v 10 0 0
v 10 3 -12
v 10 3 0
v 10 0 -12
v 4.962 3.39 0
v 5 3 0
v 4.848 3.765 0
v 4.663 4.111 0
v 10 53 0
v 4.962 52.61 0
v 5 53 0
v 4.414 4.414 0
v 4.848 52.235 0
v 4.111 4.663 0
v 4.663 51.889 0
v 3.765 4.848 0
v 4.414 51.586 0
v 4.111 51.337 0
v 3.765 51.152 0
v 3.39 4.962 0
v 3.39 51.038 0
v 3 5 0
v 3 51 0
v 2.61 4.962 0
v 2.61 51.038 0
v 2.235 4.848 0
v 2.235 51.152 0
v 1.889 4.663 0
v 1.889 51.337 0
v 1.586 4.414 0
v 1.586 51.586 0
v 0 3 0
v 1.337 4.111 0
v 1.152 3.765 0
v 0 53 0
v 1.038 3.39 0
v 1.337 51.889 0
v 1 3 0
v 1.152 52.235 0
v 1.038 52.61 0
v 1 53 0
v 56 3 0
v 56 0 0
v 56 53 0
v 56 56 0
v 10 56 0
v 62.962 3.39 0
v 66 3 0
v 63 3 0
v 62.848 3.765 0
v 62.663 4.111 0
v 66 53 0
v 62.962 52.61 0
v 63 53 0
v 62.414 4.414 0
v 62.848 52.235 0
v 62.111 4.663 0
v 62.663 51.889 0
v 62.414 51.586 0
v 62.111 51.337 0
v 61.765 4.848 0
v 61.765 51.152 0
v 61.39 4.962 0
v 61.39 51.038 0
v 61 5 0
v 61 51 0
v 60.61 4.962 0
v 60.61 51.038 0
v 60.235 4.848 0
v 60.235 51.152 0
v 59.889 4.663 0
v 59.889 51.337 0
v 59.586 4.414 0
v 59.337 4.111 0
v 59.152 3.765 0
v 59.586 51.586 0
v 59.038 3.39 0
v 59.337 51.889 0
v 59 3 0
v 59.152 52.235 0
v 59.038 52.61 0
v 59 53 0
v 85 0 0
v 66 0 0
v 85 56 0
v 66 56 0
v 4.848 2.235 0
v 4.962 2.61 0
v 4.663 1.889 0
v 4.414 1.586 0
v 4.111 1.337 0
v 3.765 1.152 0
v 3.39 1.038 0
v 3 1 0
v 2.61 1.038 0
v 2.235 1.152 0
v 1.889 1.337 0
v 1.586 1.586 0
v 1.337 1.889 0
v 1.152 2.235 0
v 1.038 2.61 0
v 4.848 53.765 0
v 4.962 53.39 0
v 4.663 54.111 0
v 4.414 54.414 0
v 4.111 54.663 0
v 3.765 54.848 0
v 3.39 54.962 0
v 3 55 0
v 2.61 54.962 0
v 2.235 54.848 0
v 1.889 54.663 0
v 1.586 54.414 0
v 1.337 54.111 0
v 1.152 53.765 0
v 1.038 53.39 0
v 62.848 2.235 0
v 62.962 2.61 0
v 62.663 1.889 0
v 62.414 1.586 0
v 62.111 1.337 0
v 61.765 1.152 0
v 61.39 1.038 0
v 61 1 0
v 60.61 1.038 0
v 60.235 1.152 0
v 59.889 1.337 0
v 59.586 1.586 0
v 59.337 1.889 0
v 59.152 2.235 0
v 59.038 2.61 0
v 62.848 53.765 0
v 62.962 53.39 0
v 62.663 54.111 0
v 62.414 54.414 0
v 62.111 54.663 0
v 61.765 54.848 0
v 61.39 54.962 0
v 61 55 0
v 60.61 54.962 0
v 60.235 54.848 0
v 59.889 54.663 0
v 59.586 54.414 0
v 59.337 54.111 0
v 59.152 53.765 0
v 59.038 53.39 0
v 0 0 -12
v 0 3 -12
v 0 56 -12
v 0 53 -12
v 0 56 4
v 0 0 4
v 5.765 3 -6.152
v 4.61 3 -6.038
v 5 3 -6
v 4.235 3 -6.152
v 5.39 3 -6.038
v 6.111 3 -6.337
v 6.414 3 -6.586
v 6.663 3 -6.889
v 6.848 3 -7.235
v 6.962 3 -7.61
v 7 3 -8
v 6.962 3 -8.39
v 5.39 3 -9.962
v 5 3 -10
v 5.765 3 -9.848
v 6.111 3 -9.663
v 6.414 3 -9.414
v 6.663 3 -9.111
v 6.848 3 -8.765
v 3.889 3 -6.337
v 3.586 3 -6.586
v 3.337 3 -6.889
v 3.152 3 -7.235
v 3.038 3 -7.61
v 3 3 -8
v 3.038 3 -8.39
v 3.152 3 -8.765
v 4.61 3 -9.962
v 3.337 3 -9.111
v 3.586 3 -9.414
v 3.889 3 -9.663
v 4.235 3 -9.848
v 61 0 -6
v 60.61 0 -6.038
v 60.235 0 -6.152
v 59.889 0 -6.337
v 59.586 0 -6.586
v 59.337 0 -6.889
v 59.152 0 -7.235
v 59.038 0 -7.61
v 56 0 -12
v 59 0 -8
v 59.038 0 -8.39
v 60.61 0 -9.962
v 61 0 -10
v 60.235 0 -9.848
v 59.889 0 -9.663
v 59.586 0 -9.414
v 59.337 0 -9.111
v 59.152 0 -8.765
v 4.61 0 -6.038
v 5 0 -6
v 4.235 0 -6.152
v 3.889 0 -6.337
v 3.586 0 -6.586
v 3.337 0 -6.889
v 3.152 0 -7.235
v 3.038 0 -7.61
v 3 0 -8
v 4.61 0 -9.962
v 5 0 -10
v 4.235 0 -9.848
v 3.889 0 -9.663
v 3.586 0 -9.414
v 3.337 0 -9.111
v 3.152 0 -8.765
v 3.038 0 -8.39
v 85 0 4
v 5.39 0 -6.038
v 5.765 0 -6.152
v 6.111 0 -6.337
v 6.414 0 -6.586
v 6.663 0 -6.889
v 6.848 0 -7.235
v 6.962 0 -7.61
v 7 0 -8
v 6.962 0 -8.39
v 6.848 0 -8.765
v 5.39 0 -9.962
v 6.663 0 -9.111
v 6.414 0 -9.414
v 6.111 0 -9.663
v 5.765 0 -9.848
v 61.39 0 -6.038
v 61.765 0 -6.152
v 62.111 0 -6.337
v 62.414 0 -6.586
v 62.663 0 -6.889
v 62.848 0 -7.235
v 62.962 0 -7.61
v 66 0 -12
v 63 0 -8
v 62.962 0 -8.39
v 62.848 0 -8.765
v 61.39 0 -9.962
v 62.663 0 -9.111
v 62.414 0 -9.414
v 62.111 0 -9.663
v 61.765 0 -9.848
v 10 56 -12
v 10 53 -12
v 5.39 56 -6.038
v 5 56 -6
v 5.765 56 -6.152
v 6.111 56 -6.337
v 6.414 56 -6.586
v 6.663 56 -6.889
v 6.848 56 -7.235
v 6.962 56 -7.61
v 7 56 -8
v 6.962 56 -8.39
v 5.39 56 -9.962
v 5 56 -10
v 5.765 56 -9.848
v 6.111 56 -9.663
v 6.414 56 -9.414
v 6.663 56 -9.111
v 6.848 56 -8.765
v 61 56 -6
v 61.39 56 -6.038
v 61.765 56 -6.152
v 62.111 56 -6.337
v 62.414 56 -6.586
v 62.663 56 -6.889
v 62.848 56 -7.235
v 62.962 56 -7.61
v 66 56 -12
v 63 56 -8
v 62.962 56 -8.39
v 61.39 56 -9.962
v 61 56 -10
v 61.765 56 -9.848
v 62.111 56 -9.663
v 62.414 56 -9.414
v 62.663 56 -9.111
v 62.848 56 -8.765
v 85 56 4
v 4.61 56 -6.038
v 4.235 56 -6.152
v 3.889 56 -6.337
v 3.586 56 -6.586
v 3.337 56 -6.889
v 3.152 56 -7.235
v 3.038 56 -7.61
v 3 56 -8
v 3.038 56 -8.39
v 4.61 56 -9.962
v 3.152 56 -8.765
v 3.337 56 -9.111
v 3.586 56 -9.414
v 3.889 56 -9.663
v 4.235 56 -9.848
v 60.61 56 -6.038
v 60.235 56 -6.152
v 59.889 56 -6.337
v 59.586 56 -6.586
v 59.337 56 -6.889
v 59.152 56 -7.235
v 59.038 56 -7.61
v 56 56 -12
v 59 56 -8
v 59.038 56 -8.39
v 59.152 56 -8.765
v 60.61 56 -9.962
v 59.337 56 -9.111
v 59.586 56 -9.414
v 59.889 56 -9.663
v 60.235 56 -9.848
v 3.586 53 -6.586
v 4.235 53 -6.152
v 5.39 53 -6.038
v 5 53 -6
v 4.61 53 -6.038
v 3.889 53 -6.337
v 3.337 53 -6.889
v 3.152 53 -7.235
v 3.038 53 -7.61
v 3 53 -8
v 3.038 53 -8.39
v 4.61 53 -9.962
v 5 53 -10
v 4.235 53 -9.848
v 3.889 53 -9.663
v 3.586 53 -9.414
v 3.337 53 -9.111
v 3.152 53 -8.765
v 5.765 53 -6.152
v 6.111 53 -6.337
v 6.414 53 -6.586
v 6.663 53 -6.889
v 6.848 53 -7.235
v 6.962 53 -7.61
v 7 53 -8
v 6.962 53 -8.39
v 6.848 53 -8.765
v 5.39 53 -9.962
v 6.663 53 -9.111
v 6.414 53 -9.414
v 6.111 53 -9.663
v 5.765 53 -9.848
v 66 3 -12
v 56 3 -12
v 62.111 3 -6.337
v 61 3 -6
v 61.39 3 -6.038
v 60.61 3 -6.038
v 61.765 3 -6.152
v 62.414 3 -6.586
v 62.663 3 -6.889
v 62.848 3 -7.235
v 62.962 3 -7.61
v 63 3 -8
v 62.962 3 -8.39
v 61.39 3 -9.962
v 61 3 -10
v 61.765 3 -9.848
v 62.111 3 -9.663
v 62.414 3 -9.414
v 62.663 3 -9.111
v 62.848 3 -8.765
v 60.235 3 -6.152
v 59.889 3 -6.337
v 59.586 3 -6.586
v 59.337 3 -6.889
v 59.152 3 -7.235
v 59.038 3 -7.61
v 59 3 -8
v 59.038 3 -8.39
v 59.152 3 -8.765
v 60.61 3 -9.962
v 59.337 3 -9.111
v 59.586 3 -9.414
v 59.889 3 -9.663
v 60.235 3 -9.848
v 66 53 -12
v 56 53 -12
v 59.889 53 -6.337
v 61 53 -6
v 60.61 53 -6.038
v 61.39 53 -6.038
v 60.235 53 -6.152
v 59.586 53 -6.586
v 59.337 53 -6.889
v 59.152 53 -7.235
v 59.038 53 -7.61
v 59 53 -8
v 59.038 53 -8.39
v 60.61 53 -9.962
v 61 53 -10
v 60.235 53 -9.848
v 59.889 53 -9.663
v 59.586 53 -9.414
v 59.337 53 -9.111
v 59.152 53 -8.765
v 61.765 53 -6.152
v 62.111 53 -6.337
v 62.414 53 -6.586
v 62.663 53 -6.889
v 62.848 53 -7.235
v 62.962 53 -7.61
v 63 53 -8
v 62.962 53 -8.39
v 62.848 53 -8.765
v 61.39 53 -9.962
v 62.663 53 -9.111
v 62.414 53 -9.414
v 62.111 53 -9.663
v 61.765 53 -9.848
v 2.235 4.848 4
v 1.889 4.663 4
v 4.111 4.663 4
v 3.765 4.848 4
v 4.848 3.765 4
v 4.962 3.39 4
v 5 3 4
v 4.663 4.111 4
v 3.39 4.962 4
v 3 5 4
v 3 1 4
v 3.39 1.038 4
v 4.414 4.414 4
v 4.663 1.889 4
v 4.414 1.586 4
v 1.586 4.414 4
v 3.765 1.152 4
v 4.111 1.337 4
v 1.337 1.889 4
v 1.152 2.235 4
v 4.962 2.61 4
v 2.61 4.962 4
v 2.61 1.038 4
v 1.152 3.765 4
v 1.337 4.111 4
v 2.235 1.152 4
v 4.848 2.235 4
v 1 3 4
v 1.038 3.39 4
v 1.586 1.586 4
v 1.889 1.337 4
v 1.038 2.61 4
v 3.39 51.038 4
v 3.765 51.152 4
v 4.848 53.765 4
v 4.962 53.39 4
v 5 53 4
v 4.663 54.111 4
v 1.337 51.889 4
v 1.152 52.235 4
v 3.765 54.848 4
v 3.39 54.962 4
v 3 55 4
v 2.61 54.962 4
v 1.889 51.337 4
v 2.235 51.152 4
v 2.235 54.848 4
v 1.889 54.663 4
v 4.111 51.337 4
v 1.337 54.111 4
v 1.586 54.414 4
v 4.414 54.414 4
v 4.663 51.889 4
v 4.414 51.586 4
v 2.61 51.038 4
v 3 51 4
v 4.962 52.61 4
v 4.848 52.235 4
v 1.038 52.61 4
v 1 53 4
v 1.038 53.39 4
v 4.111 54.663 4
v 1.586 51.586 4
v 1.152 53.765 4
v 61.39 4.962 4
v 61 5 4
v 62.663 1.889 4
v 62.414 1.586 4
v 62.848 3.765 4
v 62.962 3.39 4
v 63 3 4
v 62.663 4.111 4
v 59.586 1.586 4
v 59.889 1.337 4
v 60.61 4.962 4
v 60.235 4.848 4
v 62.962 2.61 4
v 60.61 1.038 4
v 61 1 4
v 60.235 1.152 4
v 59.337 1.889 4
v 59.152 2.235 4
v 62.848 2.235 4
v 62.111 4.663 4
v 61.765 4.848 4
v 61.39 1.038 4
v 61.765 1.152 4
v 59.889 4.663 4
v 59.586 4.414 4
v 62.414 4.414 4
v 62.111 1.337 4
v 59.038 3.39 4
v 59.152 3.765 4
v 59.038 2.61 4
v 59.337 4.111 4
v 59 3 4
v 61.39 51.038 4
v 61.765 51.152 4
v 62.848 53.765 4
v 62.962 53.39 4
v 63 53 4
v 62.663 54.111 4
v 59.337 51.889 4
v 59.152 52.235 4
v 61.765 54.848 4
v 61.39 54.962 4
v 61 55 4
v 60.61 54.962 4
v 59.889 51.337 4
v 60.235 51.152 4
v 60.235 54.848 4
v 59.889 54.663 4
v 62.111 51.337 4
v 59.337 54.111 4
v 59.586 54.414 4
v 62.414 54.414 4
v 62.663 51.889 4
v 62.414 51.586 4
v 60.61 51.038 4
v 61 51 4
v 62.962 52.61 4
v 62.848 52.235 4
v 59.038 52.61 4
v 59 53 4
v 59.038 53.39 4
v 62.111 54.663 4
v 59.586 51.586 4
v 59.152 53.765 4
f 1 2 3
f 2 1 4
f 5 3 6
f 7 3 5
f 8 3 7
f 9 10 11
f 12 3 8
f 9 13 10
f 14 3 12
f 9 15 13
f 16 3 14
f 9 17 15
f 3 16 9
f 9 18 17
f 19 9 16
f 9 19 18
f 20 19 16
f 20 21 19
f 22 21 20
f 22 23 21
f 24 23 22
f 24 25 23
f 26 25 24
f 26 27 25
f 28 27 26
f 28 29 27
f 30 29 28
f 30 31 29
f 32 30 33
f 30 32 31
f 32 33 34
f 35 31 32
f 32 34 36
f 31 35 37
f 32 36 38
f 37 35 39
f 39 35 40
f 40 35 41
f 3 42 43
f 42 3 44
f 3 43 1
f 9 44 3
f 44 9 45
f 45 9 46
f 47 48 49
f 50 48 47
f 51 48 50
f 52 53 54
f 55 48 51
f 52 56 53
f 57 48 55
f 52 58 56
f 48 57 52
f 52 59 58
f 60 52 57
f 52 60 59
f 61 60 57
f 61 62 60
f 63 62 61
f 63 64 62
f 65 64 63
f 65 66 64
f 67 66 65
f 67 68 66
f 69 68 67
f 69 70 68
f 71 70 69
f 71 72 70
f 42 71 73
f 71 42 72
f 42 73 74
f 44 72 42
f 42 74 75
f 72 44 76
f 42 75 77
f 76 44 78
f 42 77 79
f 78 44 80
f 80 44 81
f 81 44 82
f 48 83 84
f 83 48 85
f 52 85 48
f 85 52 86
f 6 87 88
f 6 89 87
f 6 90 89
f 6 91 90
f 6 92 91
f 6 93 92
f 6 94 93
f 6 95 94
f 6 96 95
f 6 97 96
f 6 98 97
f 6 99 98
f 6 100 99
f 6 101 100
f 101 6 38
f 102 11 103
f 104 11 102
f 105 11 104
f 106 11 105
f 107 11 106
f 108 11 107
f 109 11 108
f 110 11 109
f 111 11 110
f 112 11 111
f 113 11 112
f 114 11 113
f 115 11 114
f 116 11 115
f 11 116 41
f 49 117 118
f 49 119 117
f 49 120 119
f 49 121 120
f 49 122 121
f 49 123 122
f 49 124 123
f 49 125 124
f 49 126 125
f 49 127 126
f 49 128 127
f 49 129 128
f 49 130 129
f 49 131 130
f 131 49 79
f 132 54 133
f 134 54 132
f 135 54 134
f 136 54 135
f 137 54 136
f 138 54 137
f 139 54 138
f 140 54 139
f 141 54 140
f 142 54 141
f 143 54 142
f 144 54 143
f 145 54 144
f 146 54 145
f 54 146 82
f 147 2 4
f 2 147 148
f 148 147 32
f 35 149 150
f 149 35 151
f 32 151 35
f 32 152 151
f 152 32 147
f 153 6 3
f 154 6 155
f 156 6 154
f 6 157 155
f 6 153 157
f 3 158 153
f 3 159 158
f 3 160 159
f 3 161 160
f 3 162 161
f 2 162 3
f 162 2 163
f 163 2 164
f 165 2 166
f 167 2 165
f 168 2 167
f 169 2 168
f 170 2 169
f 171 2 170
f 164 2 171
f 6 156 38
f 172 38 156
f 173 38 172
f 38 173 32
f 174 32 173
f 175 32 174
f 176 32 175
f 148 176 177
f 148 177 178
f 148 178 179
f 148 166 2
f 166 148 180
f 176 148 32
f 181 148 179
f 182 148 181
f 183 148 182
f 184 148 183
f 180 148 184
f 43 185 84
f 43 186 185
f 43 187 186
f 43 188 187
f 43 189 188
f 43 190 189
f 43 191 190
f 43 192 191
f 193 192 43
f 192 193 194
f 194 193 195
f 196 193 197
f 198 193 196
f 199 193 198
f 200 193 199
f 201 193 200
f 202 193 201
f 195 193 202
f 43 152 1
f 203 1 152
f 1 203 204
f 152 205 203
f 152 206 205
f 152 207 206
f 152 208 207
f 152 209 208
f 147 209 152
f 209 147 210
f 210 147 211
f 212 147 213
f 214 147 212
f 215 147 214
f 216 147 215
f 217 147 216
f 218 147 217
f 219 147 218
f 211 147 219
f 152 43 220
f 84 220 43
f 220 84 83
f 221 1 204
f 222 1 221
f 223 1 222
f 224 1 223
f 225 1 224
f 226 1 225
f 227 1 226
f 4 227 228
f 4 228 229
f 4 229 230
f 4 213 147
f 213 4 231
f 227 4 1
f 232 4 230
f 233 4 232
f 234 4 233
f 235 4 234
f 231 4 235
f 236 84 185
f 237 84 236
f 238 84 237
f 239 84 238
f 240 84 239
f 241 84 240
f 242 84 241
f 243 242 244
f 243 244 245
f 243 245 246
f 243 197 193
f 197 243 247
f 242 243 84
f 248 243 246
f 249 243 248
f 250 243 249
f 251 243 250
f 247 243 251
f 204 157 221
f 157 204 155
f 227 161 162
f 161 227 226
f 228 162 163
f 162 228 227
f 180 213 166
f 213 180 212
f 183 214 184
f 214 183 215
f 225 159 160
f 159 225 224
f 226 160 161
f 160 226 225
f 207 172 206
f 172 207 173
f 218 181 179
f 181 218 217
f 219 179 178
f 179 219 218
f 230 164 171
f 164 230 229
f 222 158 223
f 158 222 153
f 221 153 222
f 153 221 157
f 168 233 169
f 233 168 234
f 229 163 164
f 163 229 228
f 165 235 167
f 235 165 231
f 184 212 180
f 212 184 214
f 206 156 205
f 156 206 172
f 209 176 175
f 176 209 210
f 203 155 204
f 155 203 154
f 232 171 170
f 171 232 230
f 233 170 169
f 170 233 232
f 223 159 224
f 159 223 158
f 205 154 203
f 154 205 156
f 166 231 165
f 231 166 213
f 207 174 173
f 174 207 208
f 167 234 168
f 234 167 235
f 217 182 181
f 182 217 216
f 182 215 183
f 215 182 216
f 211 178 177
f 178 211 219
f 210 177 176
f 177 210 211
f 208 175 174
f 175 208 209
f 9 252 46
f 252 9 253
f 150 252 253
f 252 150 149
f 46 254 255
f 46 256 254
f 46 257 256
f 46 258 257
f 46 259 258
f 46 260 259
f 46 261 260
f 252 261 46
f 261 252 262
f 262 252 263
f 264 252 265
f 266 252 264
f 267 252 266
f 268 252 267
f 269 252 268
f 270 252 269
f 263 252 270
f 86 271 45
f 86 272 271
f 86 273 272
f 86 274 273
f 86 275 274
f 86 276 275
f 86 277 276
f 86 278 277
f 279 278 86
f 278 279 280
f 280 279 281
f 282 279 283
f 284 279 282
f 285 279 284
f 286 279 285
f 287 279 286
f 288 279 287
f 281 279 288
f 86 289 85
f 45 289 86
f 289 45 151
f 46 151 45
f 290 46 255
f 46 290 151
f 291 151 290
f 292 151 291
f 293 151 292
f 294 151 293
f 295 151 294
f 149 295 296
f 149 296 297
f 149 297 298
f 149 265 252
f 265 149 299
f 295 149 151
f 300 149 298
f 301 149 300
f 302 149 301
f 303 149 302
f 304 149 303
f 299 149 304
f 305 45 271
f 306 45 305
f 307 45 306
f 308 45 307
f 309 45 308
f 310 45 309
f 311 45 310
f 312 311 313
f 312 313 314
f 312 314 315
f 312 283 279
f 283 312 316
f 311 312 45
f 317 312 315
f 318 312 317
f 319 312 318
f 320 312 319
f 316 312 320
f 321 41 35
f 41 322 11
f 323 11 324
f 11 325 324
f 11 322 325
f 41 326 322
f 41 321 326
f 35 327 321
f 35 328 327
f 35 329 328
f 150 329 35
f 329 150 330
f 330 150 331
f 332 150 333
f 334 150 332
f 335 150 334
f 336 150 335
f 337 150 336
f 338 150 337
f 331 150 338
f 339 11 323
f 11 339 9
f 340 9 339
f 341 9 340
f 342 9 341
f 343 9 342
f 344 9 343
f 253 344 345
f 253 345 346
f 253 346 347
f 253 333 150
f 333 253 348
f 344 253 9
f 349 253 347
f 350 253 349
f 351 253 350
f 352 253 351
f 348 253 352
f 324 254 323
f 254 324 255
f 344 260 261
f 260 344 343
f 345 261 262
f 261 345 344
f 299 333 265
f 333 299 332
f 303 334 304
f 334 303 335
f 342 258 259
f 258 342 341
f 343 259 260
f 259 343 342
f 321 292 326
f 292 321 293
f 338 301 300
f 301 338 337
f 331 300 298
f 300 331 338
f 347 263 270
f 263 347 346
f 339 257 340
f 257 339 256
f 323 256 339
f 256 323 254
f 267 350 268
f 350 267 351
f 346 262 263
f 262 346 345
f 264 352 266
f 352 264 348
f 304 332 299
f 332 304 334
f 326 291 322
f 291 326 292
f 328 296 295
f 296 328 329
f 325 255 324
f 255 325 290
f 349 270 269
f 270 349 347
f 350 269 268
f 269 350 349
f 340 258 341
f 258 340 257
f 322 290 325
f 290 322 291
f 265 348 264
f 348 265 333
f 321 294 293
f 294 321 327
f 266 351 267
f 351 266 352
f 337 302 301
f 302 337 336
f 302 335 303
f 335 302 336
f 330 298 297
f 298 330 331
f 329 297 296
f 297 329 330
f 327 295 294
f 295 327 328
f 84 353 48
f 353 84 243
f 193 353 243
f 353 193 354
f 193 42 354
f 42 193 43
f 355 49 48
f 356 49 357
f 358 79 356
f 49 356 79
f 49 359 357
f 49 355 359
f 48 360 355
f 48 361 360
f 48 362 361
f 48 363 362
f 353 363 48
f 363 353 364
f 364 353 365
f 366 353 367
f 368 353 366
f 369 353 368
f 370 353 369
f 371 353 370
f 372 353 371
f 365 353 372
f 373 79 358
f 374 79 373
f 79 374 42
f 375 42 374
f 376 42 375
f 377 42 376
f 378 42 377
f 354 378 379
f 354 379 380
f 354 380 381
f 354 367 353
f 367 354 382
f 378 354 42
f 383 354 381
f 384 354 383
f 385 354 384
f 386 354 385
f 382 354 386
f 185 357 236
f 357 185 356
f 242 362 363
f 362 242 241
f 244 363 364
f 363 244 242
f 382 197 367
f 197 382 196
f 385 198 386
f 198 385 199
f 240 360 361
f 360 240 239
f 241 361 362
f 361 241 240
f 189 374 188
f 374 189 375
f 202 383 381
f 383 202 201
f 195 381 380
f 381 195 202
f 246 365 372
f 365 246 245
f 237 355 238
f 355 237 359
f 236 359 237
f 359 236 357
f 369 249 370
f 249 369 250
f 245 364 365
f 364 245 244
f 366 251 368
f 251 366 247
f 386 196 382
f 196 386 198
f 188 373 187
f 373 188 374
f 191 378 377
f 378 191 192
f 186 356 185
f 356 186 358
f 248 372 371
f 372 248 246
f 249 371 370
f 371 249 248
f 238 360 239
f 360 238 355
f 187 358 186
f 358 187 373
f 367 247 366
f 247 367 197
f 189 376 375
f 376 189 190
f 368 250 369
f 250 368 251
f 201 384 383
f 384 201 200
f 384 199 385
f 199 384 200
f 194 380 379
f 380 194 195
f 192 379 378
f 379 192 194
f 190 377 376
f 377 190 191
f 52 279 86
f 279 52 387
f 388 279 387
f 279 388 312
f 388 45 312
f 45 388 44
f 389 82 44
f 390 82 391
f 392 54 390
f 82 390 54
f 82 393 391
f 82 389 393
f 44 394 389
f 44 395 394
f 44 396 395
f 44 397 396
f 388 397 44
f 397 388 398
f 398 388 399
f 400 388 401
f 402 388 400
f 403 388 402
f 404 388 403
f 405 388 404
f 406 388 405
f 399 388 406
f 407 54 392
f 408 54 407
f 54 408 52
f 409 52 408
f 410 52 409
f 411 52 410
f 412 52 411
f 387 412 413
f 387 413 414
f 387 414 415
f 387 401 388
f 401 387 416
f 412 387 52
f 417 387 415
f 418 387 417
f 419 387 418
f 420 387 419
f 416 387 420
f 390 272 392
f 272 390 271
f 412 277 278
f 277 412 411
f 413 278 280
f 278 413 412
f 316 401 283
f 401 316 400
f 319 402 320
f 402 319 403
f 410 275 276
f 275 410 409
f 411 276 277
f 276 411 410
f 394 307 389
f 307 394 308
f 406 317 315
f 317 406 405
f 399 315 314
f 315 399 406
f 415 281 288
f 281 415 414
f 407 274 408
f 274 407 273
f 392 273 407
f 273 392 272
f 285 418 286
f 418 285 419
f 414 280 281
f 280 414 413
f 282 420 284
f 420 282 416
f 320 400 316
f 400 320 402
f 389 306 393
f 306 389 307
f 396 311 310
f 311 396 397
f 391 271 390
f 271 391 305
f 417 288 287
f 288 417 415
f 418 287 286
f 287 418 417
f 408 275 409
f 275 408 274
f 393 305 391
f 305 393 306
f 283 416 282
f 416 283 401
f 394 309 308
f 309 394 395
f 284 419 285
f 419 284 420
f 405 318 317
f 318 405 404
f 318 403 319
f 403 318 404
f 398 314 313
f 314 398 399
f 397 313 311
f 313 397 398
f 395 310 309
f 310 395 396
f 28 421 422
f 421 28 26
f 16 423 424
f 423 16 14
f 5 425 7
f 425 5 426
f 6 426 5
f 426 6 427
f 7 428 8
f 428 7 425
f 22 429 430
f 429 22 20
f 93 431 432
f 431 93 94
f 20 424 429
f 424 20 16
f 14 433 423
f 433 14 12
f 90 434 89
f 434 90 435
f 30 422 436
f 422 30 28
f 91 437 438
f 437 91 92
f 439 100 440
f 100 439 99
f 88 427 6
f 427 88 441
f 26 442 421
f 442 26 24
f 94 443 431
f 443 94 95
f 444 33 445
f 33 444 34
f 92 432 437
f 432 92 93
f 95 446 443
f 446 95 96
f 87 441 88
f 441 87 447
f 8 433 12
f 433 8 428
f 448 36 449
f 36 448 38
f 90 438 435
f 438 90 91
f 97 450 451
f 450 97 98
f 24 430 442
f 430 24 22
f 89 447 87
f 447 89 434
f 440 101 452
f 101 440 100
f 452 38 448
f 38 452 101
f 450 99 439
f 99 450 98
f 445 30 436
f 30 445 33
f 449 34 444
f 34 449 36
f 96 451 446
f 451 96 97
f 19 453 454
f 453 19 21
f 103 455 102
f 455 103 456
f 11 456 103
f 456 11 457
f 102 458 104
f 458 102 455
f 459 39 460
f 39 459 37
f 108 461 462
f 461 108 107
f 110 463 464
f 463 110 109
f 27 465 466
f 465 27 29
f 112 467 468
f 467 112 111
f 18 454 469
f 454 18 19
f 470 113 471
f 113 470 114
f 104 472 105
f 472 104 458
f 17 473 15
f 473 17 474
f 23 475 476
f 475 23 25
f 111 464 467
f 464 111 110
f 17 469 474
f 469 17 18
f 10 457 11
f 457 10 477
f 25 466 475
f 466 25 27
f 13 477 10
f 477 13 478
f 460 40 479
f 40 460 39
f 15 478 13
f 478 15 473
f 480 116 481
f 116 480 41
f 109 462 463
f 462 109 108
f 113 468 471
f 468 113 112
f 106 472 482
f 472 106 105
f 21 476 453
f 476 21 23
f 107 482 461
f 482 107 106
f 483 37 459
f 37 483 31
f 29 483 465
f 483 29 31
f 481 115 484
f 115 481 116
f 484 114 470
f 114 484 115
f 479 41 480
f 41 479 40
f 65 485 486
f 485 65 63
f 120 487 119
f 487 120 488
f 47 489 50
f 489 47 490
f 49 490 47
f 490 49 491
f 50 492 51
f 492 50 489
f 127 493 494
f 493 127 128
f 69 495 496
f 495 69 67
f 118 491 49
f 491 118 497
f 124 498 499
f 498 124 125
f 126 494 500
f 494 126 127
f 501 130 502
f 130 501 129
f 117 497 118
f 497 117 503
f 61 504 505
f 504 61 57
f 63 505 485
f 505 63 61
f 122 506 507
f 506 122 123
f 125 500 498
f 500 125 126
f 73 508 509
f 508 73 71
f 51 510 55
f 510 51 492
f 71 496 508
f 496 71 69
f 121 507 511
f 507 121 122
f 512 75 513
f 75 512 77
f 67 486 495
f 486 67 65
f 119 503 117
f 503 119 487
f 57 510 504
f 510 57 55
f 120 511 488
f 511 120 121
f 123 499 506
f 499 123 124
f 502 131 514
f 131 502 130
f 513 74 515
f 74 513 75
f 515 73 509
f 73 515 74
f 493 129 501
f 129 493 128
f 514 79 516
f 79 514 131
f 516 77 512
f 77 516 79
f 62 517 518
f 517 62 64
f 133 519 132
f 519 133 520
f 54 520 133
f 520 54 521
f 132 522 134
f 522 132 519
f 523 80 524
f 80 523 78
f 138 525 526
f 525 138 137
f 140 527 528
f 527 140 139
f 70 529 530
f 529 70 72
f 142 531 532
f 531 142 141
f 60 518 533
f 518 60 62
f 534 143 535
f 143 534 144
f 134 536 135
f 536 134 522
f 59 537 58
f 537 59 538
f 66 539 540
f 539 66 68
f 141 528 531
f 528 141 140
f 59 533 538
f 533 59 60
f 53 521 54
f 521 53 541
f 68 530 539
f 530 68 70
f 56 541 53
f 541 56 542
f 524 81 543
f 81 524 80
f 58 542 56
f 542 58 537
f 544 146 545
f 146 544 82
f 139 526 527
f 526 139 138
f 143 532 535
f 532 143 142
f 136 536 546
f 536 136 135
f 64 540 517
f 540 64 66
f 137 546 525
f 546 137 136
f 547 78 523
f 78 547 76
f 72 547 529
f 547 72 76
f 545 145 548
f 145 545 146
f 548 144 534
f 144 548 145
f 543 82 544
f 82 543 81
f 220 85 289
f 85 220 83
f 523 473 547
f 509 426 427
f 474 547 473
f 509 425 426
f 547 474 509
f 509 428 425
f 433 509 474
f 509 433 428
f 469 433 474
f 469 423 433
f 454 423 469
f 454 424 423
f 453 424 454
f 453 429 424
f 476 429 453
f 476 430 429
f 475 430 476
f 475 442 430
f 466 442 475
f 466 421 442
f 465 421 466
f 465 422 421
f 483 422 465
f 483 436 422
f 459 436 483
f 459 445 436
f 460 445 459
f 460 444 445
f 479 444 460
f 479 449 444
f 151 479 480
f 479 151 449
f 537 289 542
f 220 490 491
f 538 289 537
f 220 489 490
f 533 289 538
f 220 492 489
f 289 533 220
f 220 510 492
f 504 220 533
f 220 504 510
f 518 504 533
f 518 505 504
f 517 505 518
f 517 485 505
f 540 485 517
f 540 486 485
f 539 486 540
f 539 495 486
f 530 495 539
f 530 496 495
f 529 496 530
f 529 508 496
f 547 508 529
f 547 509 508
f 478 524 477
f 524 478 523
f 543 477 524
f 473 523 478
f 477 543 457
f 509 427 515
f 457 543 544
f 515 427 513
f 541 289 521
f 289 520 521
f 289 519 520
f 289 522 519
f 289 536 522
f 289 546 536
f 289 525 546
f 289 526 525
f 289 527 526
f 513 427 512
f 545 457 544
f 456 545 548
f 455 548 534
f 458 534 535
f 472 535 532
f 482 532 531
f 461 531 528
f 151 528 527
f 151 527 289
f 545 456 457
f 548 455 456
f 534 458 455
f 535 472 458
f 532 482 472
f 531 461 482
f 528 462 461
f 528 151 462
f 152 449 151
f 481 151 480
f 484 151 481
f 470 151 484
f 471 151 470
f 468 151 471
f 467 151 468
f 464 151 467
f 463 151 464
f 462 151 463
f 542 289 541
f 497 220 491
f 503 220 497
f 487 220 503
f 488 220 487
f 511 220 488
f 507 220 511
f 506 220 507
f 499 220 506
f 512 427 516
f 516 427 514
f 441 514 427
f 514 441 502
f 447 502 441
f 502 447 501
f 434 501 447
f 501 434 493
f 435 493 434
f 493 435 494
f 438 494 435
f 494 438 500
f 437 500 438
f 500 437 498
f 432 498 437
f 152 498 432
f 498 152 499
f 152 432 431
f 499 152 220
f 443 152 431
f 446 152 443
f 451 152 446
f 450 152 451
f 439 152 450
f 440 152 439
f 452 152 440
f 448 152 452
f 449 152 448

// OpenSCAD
$fn = 32;

BASE_WIDTH = 56;
BASE_LENGTH = 85;
HEIGHT = 4;

HOLES_DIST = 58;
CYLINDER_OFFSET = 3;

HANGER_LEN = 10;
HANGER_WIDTH = 3;
HANGER_HEIGHT = 12;



module cylinders3(h, r1, r2, LEN, WIDTH, xNum, yNum) {
     for (i = [0:LEN/(xNum-1):LEN]){
         for (n = [0:WIDTH/(yNum-1):WIDTH]){    translate([-HANGER_LEN/2 + CYLINDER_OFFSET + HOLES_DIST,0,0]) hanger();
    translate([-HANGER_LEN/2 + CYLINDER_OFFSET + HOLES_DIST,BASE_WIDTH - HANGER_WIDTH,0]) hanger();
             translate([i,n,0])cylinder(h, r1, r2);
            }
        }    
    } 

module hanger() {
    difference() {
        translate([0,0,-HANGER_HEIGHT]) cube([HANGER_LEN,HANGER_WIDTH,HANGER_HEIGHT]);
        translate([0,0,-HANGER_HEIGHT]) translate([HANGER_LEN/2,4,4]) rotate([90,0,0]) cylinder(10,2,2);
        }
    }

module base() {
    difference() {
        cube([BASE_LENGTH, BASE_WIDTH, HEIGHT]);
            translate([CYLINDER_OFFSET, CYLINDER_OFFSET, -1]) cylinders3(10, 2, 2, HOLES_DIST, BASE_WIDTH - CYLINDER_OFFSET * 2, 2, 2);
        }
    }
    translate([0,0,0]) hanger();
    translate([0,BASE_WIDTH - HANGER_WIDTH,0]) hanger();
    translate([-HANGER_LEN/2 + CYLINDER_OFFSET + HOLES_DIST,0,0]) hanger();
    translate([-HANGER_LEN/2 + CYLINDER_OFFSET + HOLES_DIST,BASE_WIDTH - HANGER_WIDTH,0]) hanger();
    
base();
